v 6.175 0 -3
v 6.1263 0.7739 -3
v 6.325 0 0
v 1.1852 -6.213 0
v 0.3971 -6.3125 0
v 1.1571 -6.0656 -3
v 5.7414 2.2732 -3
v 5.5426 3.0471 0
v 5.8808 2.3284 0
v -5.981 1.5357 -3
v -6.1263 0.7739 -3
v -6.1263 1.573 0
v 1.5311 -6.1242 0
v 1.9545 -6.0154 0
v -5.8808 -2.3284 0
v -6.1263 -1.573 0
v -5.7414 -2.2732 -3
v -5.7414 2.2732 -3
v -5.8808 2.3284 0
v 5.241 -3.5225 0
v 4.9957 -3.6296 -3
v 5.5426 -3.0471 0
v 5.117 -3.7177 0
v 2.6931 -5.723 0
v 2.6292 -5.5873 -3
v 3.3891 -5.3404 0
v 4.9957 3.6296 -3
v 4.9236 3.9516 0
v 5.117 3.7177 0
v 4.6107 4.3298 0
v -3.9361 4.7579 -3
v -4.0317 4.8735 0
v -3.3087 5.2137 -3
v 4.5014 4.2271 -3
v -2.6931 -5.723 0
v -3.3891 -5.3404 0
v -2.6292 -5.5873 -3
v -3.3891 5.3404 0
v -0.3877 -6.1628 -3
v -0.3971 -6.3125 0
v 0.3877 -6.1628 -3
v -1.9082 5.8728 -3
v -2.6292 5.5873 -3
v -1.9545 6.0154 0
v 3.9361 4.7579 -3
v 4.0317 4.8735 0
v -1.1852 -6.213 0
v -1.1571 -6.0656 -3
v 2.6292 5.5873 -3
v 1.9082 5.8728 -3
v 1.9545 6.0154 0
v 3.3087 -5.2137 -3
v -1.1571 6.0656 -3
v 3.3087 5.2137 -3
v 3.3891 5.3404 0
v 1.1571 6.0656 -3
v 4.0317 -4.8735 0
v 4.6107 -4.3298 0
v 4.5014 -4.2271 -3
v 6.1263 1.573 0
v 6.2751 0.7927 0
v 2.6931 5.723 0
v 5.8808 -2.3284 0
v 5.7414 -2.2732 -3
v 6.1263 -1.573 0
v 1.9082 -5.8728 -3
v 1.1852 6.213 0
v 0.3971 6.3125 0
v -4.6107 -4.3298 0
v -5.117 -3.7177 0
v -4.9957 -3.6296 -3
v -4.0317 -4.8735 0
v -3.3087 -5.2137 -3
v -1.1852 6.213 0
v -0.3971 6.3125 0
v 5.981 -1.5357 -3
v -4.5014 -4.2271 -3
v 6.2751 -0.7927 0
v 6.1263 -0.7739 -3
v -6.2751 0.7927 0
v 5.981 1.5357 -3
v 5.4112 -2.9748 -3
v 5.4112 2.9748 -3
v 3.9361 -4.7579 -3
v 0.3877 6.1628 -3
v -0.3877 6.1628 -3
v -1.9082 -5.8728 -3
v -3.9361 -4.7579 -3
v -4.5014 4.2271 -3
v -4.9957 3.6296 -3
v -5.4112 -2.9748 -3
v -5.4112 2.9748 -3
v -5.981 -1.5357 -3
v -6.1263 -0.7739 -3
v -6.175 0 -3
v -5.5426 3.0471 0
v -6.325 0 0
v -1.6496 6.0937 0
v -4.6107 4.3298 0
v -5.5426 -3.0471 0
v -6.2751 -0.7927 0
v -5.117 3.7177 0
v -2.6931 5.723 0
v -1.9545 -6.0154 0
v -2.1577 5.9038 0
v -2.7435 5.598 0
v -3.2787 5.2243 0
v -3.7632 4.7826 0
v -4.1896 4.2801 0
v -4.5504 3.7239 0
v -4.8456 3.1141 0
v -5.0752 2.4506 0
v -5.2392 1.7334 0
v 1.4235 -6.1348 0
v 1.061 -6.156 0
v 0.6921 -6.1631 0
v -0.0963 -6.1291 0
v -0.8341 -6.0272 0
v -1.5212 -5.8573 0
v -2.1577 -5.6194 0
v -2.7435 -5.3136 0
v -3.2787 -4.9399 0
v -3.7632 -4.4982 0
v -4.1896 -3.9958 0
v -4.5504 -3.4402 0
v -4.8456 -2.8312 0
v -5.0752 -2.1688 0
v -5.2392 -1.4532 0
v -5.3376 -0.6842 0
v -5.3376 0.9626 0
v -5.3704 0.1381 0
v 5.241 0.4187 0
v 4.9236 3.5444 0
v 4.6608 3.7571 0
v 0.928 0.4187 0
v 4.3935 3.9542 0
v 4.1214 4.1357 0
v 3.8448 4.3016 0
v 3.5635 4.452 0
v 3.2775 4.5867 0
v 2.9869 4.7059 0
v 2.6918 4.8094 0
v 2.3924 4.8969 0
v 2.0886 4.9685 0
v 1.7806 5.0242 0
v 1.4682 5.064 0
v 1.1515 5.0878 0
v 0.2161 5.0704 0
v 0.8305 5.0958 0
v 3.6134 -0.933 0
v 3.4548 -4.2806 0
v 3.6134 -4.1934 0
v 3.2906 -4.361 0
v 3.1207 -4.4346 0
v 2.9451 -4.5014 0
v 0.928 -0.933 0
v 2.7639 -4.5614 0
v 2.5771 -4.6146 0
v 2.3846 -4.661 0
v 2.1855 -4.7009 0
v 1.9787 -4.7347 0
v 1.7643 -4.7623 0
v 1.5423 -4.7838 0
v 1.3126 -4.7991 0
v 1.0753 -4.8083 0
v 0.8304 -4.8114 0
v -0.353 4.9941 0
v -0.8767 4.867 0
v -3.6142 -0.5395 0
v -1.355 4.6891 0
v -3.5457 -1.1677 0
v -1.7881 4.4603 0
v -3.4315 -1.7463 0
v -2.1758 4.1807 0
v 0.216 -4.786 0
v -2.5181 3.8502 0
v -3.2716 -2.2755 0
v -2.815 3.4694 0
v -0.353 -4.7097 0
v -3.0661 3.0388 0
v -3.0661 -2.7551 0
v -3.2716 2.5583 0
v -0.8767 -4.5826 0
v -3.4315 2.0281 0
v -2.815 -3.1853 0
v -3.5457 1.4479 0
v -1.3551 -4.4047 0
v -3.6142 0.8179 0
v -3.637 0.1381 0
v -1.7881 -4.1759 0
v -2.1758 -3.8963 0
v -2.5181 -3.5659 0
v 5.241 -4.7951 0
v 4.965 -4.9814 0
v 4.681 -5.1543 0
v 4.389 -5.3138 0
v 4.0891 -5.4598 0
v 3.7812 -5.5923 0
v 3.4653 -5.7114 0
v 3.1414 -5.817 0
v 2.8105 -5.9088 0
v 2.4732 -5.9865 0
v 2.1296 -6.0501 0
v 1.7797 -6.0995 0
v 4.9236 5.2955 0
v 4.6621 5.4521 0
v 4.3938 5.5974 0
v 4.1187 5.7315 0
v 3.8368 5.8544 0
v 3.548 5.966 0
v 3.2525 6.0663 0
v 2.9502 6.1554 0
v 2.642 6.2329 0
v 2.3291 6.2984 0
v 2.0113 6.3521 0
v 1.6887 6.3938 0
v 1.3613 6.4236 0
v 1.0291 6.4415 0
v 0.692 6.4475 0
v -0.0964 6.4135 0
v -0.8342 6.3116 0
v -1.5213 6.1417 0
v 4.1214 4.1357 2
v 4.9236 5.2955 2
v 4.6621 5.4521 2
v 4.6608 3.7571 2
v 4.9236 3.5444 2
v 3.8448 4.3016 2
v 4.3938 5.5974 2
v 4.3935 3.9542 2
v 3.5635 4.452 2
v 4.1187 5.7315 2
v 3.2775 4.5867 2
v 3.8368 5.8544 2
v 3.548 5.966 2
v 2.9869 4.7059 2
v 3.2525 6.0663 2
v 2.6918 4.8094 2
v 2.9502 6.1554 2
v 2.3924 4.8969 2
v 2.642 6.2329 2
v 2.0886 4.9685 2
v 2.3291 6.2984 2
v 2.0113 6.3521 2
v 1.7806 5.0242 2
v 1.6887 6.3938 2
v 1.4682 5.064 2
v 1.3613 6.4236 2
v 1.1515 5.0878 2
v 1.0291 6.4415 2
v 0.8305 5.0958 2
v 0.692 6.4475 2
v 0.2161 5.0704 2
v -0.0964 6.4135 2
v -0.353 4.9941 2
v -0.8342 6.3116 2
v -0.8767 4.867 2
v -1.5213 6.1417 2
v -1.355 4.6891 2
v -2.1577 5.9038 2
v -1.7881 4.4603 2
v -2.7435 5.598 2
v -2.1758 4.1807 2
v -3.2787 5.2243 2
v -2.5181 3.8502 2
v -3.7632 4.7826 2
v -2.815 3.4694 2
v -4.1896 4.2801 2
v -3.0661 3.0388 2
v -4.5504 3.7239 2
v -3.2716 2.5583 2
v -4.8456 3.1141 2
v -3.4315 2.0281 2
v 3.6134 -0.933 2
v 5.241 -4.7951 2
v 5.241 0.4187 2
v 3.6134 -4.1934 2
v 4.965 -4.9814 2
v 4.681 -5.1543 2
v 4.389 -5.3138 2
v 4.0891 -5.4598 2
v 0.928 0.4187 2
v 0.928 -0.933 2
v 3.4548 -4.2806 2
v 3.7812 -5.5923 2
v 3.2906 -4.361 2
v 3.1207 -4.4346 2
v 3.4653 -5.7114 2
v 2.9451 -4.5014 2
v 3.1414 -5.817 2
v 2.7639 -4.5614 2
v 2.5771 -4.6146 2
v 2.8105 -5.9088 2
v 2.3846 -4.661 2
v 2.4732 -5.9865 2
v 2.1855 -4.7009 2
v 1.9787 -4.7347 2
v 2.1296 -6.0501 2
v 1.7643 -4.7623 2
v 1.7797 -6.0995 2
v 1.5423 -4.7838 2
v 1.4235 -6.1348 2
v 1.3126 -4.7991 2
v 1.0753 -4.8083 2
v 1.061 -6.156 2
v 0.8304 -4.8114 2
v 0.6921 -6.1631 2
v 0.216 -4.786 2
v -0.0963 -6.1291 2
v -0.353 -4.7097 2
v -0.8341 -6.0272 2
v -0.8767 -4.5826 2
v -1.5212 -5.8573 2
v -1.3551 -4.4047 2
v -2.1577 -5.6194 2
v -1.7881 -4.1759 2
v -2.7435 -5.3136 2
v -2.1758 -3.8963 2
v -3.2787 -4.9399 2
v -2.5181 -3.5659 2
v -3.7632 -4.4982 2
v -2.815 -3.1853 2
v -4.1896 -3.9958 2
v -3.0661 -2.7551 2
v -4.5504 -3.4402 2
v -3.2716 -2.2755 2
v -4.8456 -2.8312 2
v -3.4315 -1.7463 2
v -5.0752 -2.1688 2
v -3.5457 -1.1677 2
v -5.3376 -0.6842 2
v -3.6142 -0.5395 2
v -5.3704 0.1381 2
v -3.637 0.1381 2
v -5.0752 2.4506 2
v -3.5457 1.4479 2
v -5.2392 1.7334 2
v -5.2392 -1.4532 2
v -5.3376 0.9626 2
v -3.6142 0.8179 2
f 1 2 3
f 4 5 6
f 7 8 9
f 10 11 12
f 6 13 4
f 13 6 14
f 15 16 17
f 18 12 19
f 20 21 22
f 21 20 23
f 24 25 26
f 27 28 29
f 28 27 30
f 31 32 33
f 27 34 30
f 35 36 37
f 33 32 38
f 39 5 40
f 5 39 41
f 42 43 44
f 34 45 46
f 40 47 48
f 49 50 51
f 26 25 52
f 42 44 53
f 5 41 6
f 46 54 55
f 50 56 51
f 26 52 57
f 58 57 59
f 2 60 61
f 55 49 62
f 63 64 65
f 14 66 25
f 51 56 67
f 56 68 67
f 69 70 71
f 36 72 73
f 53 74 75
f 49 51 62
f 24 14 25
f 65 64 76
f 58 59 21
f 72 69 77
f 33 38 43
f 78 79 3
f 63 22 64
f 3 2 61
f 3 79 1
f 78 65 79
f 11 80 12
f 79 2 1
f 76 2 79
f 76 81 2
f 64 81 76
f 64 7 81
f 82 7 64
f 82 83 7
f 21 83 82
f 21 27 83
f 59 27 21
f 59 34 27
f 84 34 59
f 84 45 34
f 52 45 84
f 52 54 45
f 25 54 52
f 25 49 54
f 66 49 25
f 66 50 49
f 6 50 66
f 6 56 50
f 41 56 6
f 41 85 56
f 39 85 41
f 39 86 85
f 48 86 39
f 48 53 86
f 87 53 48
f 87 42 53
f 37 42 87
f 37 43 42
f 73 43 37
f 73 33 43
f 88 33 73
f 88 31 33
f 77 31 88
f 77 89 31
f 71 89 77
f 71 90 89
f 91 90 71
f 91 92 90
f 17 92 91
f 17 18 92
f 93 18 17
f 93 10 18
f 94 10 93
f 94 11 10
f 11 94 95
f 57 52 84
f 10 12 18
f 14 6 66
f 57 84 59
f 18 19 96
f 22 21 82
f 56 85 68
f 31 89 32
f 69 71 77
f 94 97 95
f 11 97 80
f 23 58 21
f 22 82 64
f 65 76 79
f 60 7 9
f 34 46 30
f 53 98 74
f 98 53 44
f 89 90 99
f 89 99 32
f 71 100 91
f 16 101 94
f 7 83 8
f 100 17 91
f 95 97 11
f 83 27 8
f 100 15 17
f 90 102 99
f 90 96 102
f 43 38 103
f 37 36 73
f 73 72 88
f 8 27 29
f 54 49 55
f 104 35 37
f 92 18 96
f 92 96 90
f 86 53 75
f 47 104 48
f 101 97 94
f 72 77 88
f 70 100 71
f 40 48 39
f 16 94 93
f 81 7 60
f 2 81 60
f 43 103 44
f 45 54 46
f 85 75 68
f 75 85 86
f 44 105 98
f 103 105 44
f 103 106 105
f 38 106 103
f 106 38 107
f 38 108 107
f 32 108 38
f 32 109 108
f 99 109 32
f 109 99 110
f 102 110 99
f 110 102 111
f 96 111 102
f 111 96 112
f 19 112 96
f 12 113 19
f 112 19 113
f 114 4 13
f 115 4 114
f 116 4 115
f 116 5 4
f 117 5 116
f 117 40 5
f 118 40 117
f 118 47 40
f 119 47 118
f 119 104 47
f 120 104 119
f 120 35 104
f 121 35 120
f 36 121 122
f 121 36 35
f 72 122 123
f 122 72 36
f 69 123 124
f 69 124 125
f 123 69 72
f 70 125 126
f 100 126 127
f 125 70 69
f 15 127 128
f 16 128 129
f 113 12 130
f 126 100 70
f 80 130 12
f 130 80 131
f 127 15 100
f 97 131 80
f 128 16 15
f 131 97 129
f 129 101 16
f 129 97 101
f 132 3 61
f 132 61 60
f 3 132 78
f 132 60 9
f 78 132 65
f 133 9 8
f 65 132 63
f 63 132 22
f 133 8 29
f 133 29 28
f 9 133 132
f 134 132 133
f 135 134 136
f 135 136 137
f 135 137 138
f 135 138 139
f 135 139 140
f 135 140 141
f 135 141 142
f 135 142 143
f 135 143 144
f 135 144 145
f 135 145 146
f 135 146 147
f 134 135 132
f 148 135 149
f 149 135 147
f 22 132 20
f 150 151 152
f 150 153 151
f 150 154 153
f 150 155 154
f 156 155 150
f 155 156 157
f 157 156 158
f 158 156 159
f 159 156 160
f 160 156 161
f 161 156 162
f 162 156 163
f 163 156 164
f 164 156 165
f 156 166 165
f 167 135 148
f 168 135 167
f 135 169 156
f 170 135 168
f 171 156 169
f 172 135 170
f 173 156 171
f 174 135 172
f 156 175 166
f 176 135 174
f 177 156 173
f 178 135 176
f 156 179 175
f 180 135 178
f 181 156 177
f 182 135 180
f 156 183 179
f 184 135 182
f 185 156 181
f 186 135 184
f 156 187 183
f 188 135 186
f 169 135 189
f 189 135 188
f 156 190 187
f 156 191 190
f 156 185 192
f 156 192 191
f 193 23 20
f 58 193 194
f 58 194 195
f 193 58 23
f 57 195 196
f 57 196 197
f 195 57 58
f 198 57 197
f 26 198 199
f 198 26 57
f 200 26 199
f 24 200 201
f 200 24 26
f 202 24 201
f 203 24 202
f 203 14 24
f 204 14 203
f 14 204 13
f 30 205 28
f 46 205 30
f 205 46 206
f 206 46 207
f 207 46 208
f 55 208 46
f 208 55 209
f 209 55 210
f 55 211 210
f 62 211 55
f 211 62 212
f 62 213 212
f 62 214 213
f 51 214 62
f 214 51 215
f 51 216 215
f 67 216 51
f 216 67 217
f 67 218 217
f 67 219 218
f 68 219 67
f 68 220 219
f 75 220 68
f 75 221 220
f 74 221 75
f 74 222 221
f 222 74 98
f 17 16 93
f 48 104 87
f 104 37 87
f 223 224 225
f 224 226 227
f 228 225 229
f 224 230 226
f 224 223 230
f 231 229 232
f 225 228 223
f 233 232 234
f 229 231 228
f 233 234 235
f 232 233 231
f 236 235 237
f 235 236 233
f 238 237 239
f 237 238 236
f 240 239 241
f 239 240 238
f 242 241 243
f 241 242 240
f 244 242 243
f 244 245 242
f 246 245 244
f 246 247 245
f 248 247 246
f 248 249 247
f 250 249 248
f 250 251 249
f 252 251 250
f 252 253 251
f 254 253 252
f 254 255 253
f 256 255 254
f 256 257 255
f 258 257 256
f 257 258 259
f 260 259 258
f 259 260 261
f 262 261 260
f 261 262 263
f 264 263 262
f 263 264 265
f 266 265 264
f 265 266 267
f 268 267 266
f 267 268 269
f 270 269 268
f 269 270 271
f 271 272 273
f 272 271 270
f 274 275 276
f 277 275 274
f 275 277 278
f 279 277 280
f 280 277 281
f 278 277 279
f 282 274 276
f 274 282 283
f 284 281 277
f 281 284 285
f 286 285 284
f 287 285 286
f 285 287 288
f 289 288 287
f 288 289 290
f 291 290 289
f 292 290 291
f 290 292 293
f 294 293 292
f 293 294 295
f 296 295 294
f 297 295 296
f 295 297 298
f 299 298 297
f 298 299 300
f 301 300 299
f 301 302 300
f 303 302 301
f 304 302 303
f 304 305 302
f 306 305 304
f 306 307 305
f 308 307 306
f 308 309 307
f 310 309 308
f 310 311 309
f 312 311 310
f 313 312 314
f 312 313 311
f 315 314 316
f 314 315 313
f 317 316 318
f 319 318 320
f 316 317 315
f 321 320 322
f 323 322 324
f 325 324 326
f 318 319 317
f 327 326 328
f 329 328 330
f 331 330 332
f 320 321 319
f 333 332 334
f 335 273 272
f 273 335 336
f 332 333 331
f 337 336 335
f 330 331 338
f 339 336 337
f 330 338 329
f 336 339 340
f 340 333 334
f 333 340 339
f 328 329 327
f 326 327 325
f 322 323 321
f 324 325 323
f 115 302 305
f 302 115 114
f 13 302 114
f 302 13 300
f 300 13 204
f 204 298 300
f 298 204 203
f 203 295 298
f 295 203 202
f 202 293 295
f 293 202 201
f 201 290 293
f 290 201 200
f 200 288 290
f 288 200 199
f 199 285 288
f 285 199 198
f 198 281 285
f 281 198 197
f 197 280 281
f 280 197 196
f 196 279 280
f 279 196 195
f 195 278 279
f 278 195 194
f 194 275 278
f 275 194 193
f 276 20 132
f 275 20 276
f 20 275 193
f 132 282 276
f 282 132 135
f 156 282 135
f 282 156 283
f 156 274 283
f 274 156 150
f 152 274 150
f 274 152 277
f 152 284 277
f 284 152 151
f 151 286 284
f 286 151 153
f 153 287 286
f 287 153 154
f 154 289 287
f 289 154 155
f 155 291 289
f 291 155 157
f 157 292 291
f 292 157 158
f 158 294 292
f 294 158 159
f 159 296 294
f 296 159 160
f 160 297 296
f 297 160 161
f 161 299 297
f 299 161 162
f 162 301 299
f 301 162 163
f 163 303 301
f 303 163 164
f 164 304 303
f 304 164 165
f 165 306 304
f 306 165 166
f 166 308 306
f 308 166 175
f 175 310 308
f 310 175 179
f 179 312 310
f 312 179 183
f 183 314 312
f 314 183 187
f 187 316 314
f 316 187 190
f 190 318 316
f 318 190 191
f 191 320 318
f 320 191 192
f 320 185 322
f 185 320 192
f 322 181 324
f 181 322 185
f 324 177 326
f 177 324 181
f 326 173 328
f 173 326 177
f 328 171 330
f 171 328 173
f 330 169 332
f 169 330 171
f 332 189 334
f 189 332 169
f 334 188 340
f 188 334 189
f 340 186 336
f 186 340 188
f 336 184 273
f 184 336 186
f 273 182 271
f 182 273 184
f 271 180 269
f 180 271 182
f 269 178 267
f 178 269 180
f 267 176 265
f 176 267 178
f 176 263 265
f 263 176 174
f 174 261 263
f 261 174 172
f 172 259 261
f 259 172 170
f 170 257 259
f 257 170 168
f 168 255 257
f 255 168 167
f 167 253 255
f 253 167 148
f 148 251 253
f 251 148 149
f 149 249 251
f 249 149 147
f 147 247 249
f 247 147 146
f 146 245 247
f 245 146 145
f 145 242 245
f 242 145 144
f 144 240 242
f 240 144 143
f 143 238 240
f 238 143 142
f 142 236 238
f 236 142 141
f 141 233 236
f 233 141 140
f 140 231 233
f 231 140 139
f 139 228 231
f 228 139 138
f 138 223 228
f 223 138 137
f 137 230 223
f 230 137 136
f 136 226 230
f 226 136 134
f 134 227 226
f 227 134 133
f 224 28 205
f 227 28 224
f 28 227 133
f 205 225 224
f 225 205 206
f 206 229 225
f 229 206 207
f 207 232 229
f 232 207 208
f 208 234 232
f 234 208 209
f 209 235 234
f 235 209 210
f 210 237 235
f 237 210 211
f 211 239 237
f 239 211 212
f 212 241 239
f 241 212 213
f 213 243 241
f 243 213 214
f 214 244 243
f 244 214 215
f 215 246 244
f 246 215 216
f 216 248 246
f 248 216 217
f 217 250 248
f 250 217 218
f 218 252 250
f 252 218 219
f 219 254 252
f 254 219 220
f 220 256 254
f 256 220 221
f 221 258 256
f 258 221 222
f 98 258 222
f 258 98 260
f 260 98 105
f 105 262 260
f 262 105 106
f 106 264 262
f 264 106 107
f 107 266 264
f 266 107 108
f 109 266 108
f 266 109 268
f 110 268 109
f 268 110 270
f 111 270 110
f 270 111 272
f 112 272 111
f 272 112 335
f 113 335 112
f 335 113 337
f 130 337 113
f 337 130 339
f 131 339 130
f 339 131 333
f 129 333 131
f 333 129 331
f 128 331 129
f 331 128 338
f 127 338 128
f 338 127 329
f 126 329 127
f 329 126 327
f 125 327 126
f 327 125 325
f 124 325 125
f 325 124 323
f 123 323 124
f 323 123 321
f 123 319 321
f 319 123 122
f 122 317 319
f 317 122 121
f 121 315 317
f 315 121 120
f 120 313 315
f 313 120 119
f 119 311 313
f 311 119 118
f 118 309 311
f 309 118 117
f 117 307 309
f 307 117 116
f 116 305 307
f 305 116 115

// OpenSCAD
$fn = 50;


difference() {
	union() {
		translate(v = [0, 0, -3.0000000000]) {
			cylinder(h = 3, r1 = 6.1750000000, r2 = 6.3250000000);
		}
		linear_extrude(height = 2) {
			text(font = "Impact", halign = "center", size = 12, text = "G", valign = "center");
		}
	}
	union();
}
